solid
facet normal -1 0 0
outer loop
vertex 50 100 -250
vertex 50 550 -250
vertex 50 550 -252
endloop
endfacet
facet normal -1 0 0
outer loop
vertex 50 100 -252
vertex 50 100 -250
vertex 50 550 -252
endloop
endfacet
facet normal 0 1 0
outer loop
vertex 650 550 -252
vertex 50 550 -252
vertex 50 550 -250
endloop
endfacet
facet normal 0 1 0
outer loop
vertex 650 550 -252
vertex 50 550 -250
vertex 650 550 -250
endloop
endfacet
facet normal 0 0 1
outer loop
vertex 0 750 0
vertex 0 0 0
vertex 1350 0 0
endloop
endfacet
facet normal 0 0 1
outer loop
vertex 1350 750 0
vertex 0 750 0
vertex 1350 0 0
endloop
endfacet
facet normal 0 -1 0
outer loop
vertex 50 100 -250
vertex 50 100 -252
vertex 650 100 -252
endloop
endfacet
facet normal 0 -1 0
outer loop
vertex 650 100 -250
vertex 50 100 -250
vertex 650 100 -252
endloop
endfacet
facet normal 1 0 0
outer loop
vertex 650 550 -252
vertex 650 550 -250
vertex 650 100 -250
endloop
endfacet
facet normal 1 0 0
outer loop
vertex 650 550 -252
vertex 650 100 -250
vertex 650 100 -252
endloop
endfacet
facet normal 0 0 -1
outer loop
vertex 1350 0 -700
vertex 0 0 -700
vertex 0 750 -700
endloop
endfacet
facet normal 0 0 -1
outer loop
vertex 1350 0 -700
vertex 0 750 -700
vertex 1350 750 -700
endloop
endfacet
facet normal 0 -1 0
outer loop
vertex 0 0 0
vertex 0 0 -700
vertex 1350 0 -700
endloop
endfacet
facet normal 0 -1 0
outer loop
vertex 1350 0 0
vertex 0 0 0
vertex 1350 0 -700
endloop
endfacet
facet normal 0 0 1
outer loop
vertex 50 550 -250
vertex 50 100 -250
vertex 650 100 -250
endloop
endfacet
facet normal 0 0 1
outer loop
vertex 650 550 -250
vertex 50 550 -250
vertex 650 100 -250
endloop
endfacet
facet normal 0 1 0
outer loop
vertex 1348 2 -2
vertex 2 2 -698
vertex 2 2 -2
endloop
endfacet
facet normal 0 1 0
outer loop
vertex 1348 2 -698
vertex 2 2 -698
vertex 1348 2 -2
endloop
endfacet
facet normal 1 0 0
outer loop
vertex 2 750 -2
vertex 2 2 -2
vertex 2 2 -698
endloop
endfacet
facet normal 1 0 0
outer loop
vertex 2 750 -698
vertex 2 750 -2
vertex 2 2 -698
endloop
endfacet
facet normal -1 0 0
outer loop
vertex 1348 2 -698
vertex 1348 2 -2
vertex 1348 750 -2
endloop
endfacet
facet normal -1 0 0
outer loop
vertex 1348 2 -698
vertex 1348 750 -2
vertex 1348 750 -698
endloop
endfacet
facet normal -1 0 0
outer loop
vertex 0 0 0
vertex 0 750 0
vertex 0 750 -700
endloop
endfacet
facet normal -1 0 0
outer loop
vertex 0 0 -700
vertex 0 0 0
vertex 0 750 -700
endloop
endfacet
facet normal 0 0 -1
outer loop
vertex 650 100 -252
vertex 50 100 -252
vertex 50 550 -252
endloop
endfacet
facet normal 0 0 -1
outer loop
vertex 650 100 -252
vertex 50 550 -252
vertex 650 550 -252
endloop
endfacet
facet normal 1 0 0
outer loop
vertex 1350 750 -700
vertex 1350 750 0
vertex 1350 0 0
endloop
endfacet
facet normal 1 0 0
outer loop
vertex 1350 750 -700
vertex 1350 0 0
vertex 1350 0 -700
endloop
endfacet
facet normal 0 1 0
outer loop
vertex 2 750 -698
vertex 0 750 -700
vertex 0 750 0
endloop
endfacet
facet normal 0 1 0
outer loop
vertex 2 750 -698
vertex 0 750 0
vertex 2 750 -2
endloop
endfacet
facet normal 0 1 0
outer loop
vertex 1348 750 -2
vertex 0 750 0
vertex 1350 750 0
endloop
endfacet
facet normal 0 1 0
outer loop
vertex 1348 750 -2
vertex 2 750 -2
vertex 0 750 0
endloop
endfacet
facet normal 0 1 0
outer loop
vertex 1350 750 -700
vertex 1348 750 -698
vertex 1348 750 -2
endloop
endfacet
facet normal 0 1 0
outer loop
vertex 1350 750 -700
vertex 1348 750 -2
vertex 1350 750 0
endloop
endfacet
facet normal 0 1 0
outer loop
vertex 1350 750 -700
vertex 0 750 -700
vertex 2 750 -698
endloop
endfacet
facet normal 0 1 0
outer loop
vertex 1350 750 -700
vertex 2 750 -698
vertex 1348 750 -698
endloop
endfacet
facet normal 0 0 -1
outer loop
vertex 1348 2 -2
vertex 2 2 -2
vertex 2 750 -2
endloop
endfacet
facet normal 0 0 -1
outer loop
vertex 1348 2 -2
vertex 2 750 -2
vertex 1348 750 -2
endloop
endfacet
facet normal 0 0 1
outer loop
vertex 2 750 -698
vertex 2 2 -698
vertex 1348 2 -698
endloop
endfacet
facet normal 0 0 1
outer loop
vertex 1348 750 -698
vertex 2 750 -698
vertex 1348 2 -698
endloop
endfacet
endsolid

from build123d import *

# Parameters (mm, degrees)
MASTER_FOOTPRINT_W           = 1350
MASTER_FOOTPRINT_H           = 700
BATH_BASE_PLATE_DEPTH        = 750
BATH_SHELL_2MM_T             = -2
DISTRIBUTOR_PANEL_TEST_START = 100
SKETCH_1_W                   = 600
SKETCH_1_H                   = 2
DISTRIBUTOR_PANEL_TEST_DEPTH = 450


with BuildPart() as part:
    # MASTER_FOOTPRINT → BATH_BASE_PLATE (new body)
    with BuildSketch(Plane(origin=(0, 0, 0), x_dir=(1, 0, 0), z_dir=(0, 1, 0))):
        with Locations((675, 350)):
            Rectangle(MASTER_FOOTPRINT_W, MASTER_FOOTPRINT_H)
    extrude(amount=BATH_BASE_PLATE_DEPTH)

    # BATH_SHELL_2MM
    bath_shell_2mm_openings = [part.faces().sort_by_distance(p)[0] for p in [
        (675, 750, -350),
    ]]
    offset(amount=BATH_SHELL_2MM_T, openings=bath_shell_2mm_openings, kind=Kind.INTERSECTION)


with BuildPart() as body_2:
    # Эскиз1 → DISTRIBUTOR_PANEL_TEST (new body)
    with BuildSketch(Plane(origin=(0, 0, 0), x_dir=(1, 0, 0), z_dir=(0, 1, 0)).offset(DISTRIBUTOR_PANEL_TEST_START)):
        with Locations((350, 251)):
            Rectangle(SKETCH_1_W, SKETCH_1_H)
    extrude(amount=DISTRIBUTOR_PANEL_TEST_DEPTH)


solid = Compound([part.part, body_2.part])
